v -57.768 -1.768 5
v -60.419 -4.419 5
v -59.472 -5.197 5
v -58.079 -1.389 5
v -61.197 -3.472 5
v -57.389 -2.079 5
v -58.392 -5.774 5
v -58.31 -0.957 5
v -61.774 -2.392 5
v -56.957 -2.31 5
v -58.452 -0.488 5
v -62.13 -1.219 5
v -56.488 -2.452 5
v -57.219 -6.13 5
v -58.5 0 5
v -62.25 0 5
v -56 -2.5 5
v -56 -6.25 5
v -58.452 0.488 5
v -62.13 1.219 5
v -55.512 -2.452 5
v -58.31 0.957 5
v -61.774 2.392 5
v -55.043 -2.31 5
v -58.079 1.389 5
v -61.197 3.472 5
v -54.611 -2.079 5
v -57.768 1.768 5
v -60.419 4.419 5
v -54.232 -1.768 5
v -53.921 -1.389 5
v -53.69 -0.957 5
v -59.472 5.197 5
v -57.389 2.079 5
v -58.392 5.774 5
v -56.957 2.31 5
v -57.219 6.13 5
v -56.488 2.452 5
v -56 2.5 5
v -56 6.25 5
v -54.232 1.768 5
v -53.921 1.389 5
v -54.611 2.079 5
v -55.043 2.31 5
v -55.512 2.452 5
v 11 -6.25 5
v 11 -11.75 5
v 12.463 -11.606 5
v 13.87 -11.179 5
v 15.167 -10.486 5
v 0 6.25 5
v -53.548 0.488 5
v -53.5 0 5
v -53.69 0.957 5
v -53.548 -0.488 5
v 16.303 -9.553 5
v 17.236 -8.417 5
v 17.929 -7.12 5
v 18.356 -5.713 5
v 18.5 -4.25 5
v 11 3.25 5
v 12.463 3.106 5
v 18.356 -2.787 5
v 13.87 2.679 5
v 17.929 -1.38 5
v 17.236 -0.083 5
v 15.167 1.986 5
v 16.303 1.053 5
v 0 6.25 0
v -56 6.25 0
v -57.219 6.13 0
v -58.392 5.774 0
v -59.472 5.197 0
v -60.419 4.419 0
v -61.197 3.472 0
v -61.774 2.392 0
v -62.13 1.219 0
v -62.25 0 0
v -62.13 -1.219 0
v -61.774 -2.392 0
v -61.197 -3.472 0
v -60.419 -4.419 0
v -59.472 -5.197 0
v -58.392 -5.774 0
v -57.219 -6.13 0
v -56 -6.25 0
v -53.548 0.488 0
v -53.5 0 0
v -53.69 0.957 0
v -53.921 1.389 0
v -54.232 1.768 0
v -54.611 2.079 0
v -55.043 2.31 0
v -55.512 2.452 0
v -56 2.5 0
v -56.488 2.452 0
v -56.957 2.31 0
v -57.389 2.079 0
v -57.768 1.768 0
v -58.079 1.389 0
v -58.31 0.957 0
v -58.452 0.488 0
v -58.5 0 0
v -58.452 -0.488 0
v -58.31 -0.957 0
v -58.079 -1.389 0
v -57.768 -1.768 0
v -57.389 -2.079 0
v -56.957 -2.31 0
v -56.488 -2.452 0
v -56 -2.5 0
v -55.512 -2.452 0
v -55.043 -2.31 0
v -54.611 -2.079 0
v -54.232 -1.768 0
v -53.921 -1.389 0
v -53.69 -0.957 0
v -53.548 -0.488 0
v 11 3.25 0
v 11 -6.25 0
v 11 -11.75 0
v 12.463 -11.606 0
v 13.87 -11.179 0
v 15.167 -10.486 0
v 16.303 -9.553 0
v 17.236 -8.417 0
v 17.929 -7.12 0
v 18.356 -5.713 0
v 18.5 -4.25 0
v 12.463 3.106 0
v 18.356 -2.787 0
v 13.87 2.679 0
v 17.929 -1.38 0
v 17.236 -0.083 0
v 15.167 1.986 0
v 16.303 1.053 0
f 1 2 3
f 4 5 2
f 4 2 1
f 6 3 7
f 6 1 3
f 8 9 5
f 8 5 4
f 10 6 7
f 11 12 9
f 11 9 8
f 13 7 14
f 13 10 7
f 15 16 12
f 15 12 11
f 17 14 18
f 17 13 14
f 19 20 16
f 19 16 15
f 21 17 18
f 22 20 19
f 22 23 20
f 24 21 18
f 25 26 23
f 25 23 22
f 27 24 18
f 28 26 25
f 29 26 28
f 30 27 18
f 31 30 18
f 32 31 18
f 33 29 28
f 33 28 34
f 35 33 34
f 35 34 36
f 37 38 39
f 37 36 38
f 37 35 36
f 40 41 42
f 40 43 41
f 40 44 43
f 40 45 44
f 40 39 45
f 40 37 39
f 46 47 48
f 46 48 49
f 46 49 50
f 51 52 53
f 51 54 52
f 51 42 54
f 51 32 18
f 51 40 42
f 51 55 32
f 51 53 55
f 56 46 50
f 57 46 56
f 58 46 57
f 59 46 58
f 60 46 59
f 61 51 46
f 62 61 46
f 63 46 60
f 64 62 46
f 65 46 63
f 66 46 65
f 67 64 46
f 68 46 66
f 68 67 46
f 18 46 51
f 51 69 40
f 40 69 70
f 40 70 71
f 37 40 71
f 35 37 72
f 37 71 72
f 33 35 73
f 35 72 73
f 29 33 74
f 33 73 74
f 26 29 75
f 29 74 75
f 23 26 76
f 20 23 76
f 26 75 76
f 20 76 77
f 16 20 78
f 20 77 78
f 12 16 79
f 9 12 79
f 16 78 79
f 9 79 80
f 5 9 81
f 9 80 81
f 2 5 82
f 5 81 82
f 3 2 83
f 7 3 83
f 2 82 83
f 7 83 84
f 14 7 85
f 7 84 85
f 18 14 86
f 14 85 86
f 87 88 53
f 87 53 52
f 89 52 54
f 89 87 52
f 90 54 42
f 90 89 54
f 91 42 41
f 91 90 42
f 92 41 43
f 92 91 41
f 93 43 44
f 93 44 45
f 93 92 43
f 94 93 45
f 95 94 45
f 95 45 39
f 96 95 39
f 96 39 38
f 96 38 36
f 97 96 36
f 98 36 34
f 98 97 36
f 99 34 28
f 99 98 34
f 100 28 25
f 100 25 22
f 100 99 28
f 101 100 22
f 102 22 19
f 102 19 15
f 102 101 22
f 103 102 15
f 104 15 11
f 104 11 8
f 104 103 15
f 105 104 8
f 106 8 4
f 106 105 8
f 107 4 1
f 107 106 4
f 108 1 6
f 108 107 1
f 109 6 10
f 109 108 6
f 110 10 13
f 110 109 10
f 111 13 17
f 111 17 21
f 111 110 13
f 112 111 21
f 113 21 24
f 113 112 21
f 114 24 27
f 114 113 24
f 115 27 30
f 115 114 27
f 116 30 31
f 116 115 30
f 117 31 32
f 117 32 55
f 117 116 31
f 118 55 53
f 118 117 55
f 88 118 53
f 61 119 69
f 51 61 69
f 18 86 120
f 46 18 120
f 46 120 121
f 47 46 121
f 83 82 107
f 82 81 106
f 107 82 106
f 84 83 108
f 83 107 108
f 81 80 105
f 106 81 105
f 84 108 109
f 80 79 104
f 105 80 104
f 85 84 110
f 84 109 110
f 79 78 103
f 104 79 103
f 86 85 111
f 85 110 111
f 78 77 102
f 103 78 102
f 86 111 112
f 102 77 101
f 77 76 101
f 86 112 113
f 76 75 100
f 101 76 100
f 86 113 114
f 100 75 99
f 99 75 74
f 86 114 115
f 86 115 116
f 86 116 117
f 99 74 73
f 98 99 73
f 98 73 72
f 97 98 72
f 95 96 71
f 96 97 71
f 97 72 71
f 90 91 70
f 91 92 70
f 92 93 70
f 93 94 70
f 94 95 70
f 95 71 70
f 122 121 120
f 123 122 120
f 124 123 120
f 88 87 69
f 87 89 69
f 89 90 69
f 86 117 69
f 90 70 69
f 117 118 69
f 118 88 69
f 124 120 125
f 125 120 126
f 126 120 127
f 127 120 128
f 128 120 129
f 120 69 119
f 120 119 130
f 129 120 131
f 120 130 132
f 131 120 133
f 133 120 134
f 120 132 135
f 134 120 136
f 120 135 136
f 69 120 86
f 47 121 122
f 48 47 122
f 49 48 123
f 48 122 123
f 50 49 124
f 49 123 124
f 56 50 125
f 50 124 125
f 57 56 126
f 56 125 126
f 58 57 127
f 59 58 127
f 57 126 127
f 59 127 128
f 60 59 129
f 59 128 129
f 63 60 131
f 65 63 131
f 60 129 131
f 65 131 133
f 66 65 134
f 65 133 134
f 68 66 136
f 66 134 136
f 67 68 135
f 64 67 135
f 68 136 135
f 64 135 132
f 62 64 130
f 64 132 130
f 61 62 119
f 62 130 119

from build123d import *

# Parameters (mm, degrees)
F0_R     = 2.5
F1_DEPTH = 5


with BuildPart() as f1:
    # F0 (on Top) → F1 (new body)
    with BuildSketch(Plane.XY):
        with BuildLine():
            Line((11, 3.25), (0, 6.25))
            Line((0, 6.25), (-56, 6.25))
            ThreePointArc((-56, 6.25), (-62.25, 0), (-56, -6.25))
            Line((-56, -6.25), (11, -6.25))
            Line((11, -6.25), (11, -11.75))
            ThreePointArc((11, -11.75), (18.5, -4.25), (11, 3.25))
        make_face()
        with Locations((-56, 0)):
            Circle(F0_R, mode=Mode.SUBTRACT)
    extrude(amount=F1_DEPTH)


solid = f1.part
